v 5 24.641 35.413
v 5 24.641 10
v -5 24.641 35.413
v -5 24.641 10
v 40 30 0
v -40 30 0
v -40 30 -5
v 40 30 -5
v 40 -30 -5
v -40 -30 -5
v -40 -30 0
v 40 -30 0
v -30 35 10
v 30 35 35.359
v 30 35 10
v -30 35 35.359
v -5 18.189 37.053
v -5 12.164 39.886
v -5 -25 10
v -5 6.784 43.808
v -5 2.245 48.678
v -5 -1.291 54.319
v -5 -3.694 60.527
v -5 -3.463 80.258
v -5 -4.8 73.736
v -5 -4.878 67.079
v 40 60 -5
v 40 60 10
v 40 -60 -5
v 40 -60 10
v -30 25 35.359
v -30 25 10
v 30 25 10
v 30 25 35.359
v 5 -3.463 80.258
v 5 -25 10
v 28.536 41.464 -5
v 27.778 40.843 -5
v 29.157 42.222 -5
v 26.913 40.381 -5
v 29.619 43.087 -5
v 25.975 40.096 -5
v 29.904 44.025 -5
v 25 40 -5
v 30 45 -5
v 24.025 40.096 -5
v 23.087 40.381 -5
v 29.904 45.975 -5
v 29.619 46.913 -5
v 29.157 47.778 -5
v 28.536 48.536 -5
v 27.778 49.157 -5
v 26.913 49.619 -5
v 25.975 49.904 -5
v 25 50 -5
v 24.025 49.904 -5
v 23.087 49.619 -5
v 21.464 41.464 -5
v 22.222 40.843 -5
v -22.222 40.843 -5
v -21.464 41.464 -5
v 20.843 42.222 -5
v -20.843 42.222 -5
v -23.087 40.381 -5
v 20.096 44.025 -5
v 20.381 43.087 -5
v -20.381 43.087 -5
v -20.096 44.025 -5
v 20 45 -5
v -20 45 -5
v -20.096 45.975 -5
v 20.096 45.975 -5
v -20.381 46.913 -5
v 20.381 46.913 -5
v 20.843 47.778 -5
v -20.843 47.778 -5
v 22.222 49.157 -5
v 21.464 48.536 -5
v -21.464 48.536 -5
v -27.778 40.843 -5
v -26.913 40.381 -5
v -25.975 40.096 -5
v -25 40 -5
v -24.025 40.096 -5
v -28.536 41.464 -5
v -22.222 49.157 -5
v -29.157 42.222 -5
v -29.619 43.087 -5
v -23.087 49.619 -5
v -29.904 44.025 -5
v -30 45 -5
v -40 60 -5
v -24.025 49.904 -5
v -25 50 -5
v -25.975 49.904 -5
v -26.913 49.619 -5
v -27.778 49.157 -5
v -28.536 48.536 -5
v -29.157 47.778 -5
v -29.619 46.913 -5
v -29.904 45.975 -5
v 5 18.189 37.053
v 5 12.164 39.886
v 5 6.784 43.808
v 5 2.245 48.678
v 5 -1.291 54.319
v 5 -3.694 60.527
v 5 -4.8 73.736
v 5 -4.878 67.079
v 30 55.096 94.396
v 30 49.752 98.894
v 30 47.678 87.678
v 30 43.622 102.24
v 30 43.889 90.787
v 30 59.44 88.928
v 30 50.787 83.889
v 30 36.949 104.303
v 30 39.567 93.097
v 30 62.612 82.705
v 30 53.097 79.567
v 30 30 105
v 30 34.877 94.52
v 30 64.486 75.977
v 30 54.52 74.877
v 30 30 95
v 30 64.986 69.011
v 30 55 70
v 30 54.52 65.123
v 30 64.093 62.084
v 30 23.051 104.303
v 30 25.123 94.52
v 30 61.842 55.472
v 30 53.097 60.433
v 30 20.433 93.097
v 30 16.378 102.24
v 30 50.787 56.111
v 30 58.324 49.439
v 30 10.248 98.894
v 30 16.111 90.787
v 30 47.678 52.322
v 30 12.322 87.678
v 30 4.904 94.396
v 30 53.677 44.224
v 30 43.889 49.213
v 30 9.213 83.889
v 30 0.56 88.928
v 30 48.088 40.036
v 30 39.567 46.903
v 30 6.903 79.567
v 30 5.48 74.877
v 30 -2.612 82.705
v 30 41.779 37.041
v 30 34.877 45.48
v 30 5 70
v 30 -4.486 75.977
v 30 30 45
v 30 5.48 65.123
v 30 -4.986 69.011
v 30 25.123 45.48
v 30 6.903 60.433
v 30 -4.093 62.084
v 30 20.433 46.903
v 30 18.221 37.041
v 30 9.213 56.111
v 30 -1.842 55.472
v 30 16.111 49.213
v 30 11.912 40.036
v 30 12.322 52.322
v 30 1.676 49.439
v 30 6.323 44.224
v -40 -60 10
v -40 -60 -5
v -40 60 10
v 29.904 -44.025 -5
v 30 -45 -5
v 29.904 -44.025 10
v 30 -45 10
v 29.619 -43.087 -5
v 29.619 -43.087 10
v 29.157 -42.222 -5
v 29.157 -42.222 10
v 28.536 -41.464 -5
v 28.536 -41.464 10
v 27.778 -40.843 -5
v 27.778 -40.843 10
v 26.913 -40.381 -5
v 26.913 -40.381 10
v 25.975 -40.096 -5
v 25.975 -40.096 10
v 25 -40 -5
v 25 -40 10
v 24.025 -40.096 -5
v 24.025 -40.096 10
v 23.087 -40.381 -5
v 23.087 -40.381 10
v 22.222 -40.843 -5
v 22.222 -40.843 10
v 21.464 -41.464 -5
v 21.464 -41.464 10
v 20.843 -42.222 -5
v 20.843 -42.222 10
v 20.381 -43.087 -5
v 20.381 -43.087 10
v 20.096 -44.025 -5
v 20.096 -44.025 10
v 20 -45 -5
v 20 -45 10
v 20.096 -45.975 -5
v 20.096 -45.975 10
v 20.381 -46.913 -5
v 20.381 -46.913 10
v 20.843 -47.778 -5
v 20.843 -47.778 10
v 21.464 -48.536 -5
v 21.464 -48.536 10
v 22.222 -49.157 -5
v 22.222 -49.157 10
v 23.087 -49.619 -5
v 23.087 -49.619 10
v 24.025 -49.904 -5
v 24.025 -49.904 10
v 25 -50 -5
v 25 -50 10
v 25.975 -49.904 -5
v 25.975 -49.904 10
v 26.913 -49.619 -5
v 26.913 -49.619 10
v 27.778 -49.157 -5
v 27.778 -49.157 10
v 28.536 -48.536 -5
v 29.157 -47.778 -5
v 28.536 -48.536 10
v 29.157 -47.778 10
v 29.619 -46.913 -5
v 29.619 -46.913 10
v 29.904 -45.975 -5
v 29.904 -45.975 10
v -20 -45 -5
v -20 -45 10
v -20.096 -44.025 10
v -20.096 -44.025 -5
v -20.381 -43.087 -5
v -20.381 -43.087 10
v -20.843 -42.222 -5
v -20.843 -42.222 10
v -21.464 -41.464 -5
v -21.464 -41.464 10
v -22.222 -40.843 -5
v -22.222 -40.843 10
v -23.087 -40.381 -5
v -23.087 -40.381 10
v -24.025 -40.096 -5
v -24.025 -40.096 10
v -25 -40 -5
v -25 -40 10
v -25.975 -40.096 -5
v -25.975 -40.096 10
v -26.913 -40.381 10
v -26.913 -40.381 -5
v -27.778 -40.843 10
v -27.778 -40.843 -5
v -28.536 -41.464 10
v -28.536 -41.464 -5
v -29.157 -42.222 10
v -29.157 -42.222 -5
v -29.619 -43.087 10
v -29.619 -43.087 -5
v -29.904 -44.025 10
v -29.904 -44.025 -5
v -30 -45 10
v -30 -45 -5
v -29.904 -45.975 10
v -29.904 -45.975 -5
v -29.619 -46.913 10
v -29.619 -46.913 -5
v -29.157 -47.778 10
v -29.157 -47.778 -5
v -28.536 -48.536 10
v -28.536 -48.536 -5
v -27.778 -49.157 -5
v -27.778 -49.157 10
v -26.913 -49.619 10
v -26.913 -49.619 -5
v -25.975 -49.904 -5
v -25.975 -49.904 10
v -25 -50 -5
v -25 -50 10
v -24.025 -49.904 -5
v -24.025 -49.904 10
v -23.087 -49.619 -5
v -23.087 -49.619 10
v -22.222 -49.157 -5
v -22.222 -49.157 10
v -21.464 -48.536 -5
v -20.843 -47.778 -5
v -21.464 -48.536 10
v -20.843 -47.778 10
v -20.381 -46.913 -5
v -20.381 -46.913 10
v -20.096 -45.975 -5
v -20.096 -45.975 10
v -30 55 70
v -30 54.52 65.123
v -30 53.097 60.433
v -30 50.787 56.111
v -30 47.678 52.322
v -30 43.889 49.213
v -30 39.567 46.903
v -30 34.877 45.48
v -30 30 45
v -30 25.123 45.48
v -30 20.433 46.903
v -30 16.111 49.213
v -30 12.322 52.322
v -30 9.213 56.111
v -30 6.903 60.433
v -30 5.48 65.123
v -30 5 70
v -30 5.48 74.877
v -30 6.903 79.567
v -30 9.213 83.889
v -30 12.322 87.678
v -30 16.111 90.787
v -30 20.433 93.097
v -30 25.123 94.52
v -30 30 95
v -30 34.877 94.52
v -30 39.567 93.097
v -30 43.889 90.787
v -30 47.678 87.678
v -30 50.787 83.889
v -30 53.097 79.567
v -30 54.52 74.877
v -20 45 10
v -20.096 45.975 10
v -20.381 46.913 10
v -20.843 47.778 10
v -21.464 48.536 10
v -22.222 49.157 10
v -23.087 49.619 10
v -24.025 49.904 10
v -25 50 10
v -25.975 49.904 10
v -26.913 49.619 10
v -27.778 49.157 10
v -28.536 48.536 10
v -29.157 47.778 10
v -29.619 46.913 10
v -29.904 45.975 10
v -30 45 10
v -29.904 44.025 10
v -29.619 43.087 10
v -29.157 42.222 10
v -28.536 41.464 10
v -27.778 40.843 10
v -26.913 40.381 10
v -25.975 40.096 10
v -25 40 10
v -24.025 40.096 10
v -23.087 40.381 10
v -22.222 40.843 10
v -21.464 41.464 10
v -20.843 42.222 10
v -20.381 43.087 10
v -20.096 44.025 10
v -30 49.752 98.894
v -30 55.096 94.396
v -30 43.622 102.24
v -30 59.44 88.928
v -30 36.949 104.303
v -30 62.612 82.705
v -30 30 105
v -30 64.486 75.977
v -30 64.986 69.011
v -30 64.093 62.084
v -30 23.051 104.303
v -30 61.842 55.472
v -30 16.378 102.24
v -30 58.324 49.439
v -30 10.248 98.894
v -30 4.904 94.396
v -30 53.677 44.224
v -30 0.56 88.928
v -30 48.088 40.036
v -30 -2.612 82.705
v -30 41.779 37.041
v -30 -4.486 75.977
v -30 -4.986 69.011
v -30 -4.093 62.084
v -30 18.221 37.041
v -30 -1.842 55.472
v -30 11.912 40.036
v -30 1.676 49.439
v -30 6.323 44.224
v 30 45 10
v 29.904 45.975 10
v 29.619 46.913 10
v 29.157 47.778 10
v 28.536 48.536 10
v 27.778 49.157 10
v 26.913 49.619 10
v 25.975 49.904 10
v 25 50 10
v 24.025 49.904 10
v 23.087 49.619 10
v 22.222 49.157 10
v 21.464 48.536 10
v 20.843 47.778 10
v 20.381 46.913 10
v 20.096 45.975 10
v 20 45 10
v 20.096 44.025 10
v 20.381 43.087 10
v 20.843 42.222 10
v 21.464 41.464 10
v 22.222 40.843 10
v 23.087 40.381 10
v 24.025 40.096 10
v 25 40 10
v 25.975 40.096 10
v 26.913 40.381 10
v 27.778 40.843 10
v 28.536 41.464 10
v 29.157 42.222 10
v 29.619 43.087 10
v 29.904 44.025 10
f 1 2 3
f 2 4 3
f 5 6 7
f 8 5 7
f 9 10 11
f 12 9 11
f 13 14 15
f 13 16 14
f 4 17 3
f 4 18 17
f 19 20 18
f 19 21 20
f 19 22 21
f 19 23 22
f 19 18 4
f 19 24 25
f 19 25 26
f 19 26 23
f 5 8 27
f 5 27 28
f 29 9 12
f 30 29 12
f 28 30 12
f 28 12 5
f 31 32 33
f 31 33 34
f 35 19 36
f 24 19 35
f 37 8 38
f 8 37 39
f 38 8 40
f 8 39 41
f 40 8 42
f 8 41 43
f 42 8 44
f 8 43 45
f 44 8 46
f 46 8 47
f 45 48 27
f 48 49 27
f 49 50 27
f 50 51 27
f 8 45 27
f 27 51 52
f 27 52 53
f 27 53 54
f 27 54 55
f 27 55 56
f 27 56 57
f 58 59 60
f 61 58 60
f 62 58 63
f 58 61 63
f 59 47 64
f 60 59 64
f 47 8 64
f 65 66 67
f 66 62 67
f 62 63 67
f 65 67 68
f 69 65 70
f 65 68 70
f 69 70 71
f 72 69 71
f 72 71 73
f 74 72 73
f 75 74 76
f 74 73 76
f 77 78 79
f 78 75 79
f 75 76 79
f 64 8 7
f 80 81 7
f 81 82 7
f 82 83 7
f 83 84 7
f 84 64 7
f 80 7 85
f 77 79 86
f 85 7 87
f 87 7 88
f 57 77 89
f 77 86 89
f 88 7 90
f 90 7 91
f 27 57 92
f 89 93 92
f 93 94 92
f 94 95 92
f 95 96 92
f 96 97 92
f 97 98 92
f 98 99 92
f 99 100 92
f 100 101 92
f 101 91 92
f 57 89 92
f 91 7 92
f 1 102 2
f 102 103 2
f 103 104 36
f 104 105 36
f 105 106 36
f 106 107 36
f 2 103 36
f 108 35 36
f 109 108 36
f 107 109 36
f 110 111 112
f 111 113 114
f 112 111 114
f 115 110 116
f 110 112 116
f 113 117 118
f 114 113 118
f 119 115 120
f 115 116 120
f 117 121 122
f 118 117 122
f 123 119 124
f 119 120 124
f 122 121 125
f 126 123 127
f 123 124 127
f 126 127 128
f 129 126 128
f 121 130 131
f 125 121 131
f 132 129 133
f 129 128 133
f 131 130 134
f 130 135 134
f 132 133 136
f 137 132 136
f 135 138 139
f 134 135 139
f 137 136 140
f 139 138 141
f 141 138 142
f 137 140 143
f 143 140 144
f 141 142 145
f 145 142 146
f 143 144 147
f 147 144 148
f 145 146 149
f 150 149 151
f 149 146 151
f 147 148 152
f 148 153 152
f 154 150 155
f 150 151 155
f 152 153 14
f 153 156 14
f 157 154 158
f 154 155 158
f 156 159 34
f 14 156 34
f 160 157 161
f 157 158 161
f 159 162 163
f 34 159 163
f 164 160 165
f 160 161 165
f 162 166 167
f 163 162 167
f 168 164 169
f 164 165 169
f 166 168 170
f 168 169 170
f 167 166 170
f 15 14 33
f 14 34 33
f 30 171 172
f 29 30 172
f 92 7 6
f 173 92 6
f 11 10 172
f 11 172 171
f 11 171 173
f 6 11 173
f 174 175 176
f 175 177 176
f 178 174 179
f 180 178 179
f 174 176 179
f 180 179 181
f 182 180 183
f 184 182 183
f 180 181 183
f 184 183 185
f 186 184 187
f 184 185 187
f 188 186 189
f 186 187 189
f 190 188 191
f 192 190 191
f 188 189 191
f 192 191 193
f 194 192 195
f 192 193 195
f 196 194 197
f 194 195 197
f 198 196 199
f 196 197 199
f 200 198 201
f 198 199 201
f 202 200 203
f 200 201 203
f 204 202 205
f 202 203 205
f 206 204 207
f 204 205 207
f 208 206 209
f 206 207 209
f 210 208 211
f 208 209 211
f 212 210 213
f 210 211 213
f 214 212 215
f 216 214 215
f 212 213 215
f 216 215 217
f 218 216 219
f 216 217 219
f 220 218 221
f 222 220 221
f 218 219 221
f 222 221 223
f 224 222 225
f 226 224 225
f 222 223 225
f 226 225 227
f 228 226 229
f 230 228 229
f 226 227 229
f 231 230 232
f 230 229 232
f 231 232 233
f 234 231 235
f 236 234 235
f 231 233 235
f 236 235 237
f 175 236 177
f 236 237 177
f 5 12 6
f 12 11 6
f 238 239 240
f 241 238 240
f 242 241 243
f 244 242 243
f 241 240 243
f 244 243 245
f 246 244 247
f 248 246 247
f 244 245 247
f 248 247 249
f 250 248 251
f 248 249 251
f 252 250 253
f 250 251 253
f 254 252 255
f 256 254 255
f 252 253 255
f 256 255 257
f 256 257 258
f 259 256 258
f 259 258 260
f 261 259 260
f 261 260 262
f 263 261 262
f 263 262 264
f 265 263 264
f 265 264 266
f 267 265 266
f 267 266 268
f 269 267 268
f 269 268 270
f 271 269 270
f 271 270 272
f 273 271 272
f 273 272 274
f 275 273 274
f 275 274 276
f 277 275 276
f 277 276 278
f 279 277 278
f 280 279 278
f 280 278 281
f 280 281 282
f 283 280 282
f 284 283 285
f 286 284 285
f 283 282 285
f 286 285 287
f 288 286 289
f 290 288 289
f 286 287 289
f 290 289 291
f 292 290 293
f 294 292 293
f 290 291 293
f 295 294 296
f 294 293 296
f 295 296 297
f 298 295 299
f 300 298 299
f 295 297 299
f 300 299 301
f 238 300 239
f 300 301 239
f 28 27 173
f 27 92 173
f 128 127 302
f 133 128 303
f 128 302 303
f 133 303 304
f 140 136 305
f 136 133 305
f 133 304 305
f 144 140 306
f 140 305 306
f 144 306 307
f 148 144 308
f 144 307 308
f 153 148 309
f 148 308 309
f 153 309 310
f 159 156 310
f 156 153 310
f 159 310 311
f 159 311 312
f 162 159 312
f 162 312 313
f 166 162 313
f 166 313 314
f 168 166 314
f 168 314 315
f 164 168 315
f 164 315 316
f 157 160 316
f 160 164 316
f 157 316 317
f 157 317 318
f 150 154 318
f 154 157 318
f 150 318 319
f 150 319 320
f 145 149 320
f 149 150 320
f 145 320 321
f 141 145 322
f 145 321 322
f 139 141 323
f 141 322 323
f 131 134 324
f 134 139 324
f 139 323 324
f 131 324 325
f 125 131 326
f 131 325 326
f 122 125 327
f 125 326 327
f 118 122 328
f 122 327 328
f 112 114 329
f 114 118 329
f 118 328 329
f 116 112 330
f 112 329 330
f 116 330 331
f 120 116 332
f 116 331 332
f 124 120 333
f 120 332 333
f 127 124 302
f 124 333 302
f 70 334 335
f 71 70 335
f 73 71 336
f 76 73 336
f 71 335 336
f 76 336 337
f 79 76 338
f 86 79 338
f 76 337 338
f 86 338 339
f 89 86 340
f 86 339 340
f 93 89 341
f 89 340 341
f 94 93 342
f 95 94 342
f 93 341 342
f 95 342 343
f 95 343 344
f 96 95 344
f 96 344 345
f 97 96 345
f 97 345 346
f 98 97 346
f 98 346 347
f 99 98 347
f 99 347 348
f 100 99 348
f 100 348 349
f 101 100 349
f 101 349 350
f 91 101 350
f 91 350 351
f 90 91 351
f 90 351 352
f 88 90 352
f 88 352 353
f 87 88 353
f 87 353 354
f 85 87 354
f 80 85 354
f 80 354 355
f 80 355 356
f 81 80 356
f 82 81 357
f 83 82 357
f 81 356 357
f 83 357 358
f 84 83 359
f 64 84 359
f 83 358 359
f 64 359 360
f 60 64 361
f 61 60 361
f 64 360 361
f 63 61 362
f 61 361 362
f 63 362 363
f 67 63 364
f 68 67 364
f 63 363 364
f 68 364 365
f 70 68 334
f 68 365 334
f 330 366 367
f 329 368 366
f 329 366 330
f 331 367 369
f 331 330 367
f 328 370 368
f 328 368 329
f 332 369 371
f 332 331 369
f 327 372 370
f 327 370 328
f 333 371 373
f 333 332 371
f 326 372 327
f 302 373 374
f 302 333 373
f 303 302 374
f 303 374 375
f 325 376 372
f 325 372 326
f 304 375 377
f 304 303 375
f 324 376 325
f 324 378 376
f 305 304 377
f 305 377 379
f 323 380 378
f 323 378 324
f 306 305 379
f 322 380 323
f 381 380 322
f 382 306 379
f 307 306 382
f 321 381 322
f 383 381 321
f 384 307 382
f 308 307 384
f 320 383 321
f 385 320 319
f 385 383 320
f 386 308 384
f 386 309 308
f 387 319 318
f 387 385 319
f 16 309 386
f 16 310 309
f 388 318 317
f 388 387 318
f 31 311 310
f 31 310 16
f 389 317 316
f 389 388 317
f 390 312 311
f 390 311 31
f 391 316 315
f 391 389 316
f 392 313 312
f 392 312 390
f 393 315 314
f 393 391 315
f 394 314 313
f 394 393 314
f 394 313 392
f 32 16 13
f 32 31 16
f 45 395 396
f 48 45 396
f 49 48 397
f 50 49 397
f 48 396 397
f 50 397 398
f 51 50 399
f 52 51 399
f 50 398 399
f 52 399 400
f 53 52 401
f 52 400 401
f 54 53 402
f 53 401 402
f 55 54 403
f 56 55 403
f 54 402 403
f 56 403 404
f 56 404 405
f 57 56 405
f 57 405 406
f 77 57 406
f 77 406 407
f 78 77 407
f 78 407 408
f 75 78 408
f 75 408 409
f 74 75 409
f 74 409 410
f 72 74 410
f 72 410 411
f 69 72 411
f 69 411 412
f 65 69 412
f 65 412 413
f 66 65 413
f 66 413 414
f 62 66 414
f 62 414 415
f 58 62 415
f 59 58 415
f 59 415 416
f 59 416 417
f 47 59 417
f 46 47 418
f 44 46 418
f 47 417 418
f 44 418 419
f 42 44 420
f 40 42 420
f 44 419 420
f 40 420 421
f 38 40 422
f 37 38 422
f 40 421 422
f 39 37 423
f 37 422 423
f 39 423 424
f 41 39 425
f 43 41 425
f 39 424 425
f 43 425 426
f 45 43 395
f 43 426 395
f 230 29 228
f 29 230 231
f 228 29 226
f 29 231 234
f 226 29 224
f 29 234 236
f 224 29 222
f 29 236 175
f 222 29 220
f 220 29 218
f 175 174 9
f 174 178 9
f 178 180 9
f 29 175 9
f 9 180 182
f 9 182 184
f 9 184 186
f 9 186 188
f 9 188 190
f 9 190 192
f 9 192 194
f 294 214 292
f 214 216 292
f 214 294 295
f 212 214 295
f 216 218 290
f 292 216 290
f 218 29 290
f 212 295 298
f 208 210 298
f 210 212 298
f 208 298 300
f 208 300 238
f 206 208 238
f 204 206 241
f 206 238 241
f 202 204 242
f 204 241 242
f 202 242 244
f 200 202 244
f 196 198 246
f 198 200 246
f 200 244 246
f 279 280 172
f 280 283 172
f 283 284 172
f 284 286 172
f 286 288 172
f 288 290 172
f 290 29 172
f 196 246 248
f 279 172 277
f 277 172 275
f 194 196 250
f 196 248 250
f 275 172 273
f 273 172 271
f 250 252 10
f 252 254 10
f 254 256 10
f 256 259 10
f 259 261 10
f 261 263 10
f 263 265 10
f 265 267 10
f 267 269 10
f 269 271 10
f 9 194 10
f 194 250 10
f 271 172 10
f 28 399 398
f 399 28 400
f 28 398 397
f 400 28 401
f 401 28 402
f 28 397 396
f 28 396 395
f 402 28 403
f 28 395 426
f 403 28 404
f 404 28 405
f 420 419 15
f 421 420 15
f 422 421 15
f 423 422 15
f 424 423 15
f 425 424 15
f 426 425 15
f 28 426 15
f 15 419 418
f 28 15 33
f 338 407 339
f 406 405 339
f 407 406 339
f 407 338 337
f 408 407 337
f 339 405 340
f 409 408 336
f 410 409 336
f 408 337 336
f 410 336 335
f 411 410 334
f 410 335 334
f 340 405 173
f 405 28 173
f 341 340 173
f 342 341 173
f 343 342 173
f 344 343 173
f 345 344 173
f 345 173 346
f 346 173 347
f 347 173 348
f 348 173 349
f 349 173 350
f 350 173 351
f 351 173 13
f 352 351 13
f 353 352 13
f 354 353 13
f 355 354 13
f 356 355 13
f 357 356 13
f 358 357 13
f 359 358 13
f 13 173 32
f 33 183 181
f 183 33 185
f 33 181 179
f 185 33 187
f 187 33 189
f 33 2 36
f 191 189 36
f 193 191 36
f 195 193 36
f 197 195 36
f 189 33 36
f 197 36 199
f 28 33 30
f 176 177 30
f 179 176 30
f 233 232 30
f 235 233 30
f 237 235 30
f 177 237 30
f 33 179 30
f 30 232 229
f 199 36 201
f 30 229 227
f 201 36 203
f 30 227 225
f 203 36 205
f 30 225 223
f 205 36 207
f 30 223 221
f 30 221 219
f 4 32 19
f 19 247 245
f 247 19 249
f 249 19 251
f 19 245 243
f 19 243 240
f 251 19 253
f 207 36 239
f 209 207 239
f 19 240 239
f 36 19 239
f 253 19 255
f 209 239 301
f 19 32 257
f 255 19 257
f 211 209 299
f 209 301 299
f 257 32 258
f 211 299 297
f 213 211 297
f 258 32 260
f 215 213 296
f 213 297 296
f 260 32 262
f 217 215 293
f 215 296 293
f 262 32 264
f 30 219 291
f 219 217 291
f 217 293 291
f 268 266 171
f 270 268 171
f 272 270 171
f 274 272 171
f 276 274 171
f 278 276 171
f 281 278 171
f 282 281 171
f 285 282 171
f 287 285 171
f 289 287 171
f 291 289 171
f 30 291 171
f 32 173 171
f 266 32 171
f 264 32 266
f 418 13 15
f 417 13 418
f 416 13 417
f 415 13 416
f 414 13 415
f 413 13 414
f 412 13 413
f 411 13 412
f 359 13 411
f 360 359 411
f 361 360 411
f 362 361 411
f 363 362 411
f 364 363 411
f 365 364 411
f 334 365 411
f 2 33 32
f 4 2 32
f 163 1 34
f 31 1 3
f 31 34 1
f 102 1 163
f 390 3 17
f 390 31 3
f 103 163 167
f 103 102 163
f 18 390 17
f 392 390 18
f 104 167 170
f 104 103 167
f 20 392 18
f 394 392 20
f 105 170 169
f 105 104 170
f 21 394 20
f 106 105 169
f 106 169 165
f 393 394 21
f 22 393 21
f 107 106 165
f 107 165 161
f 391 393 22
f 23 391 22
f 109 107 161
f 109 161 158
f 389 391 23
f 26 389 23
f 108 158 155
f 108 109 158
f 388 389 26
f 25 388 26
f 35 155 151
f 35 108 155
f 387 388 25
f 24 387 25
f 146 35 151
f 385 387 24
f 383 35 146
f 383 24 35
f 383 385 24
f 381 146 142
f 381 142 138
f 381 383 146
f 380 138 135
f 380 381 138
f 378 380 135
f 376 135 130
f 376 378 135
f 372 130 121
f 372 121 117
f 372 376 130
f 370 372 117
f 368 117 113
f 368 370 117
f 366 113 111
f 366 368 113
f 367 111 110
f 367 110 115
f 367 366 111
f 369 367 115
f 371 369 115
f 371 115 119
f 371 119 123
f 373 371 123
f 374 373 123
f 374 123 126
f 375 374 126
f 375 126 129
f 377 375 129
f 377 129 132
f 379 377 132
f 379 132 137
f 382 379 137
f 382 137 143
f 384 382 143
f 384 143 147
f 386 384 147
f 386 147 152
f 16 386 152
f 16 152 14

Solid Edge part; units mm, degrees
sketch "Sketch1" plane through (0, 0, 0) normal (1, 0, 0) x (0, 1, 0)
  line L0 (60, 10) -> (-60, 10)
  line L1 (-60, 10) -> (-60, -5)
  line L2 (-60, -5) -> (-30, -5)
  line L3 (-30, -5) -> (-30, 0)
  line L4 (-30, 0) -> (0, 0)
  line L5 (0, 0) -> (30, 0)
  line L6 (30, 0) -> (30, -5)
  line L7 (30, -5) -> (60, -5)
  line L8 (60, -5) -> (60, 10)
extrude "Protrusion1" add sketch "Sketch1" along normal mid plane 80
sketch "Sketch2" plane through (0, 0, 10) normal (0, 0, 1) x (1, 0, 0)
  circle A0 centre (-25, -45) radius 5
  circle A1 centre (25, -45) radius 5
  circle A2 centre (25, 45) radius 5
  circle A3 centre (-25, 45) radius 5
extrude "ExtrudedCutout_1" cut sketch "Sketch2" against normal blind 41.1924
sketch "Sketch3" plane through (0, 0, 0) normal (1, 0, 0) x (0, 1, 0)
  line L0 (35, 35.359) -> (35, 10)
  line L1 (35, 10) -> (25, 10)
  line L2 (25, 10) -> (25, 35.359)
  arc A0 (25, 35.359) -> (35, 35.359) centre (30, 70) cw
  circle A1 centre (30, 70) radius 25
extrude "ExtrudedProtrusion_2" add sketch "Sketch3" along normal mid plane 60
sketch "Sketch4" plane through (0, 0, 0) normal (1, 0, 0) x (0, 1, 0)
  line L0 (-25, 10) -> (-3.4631, 80.2578)
  line L1 (24.641, 10) -> (24.641, 35.4127)
  line L2 (-25, 10) -> (24.641, 10)
  arc A0 (24.641, 35.4127) -> (-3.4631, 80.2578) centre (30, 70) cw
extrude "ExtrudedProtrusion_3" add sketch "Sketch4" along normal mid plane 10
